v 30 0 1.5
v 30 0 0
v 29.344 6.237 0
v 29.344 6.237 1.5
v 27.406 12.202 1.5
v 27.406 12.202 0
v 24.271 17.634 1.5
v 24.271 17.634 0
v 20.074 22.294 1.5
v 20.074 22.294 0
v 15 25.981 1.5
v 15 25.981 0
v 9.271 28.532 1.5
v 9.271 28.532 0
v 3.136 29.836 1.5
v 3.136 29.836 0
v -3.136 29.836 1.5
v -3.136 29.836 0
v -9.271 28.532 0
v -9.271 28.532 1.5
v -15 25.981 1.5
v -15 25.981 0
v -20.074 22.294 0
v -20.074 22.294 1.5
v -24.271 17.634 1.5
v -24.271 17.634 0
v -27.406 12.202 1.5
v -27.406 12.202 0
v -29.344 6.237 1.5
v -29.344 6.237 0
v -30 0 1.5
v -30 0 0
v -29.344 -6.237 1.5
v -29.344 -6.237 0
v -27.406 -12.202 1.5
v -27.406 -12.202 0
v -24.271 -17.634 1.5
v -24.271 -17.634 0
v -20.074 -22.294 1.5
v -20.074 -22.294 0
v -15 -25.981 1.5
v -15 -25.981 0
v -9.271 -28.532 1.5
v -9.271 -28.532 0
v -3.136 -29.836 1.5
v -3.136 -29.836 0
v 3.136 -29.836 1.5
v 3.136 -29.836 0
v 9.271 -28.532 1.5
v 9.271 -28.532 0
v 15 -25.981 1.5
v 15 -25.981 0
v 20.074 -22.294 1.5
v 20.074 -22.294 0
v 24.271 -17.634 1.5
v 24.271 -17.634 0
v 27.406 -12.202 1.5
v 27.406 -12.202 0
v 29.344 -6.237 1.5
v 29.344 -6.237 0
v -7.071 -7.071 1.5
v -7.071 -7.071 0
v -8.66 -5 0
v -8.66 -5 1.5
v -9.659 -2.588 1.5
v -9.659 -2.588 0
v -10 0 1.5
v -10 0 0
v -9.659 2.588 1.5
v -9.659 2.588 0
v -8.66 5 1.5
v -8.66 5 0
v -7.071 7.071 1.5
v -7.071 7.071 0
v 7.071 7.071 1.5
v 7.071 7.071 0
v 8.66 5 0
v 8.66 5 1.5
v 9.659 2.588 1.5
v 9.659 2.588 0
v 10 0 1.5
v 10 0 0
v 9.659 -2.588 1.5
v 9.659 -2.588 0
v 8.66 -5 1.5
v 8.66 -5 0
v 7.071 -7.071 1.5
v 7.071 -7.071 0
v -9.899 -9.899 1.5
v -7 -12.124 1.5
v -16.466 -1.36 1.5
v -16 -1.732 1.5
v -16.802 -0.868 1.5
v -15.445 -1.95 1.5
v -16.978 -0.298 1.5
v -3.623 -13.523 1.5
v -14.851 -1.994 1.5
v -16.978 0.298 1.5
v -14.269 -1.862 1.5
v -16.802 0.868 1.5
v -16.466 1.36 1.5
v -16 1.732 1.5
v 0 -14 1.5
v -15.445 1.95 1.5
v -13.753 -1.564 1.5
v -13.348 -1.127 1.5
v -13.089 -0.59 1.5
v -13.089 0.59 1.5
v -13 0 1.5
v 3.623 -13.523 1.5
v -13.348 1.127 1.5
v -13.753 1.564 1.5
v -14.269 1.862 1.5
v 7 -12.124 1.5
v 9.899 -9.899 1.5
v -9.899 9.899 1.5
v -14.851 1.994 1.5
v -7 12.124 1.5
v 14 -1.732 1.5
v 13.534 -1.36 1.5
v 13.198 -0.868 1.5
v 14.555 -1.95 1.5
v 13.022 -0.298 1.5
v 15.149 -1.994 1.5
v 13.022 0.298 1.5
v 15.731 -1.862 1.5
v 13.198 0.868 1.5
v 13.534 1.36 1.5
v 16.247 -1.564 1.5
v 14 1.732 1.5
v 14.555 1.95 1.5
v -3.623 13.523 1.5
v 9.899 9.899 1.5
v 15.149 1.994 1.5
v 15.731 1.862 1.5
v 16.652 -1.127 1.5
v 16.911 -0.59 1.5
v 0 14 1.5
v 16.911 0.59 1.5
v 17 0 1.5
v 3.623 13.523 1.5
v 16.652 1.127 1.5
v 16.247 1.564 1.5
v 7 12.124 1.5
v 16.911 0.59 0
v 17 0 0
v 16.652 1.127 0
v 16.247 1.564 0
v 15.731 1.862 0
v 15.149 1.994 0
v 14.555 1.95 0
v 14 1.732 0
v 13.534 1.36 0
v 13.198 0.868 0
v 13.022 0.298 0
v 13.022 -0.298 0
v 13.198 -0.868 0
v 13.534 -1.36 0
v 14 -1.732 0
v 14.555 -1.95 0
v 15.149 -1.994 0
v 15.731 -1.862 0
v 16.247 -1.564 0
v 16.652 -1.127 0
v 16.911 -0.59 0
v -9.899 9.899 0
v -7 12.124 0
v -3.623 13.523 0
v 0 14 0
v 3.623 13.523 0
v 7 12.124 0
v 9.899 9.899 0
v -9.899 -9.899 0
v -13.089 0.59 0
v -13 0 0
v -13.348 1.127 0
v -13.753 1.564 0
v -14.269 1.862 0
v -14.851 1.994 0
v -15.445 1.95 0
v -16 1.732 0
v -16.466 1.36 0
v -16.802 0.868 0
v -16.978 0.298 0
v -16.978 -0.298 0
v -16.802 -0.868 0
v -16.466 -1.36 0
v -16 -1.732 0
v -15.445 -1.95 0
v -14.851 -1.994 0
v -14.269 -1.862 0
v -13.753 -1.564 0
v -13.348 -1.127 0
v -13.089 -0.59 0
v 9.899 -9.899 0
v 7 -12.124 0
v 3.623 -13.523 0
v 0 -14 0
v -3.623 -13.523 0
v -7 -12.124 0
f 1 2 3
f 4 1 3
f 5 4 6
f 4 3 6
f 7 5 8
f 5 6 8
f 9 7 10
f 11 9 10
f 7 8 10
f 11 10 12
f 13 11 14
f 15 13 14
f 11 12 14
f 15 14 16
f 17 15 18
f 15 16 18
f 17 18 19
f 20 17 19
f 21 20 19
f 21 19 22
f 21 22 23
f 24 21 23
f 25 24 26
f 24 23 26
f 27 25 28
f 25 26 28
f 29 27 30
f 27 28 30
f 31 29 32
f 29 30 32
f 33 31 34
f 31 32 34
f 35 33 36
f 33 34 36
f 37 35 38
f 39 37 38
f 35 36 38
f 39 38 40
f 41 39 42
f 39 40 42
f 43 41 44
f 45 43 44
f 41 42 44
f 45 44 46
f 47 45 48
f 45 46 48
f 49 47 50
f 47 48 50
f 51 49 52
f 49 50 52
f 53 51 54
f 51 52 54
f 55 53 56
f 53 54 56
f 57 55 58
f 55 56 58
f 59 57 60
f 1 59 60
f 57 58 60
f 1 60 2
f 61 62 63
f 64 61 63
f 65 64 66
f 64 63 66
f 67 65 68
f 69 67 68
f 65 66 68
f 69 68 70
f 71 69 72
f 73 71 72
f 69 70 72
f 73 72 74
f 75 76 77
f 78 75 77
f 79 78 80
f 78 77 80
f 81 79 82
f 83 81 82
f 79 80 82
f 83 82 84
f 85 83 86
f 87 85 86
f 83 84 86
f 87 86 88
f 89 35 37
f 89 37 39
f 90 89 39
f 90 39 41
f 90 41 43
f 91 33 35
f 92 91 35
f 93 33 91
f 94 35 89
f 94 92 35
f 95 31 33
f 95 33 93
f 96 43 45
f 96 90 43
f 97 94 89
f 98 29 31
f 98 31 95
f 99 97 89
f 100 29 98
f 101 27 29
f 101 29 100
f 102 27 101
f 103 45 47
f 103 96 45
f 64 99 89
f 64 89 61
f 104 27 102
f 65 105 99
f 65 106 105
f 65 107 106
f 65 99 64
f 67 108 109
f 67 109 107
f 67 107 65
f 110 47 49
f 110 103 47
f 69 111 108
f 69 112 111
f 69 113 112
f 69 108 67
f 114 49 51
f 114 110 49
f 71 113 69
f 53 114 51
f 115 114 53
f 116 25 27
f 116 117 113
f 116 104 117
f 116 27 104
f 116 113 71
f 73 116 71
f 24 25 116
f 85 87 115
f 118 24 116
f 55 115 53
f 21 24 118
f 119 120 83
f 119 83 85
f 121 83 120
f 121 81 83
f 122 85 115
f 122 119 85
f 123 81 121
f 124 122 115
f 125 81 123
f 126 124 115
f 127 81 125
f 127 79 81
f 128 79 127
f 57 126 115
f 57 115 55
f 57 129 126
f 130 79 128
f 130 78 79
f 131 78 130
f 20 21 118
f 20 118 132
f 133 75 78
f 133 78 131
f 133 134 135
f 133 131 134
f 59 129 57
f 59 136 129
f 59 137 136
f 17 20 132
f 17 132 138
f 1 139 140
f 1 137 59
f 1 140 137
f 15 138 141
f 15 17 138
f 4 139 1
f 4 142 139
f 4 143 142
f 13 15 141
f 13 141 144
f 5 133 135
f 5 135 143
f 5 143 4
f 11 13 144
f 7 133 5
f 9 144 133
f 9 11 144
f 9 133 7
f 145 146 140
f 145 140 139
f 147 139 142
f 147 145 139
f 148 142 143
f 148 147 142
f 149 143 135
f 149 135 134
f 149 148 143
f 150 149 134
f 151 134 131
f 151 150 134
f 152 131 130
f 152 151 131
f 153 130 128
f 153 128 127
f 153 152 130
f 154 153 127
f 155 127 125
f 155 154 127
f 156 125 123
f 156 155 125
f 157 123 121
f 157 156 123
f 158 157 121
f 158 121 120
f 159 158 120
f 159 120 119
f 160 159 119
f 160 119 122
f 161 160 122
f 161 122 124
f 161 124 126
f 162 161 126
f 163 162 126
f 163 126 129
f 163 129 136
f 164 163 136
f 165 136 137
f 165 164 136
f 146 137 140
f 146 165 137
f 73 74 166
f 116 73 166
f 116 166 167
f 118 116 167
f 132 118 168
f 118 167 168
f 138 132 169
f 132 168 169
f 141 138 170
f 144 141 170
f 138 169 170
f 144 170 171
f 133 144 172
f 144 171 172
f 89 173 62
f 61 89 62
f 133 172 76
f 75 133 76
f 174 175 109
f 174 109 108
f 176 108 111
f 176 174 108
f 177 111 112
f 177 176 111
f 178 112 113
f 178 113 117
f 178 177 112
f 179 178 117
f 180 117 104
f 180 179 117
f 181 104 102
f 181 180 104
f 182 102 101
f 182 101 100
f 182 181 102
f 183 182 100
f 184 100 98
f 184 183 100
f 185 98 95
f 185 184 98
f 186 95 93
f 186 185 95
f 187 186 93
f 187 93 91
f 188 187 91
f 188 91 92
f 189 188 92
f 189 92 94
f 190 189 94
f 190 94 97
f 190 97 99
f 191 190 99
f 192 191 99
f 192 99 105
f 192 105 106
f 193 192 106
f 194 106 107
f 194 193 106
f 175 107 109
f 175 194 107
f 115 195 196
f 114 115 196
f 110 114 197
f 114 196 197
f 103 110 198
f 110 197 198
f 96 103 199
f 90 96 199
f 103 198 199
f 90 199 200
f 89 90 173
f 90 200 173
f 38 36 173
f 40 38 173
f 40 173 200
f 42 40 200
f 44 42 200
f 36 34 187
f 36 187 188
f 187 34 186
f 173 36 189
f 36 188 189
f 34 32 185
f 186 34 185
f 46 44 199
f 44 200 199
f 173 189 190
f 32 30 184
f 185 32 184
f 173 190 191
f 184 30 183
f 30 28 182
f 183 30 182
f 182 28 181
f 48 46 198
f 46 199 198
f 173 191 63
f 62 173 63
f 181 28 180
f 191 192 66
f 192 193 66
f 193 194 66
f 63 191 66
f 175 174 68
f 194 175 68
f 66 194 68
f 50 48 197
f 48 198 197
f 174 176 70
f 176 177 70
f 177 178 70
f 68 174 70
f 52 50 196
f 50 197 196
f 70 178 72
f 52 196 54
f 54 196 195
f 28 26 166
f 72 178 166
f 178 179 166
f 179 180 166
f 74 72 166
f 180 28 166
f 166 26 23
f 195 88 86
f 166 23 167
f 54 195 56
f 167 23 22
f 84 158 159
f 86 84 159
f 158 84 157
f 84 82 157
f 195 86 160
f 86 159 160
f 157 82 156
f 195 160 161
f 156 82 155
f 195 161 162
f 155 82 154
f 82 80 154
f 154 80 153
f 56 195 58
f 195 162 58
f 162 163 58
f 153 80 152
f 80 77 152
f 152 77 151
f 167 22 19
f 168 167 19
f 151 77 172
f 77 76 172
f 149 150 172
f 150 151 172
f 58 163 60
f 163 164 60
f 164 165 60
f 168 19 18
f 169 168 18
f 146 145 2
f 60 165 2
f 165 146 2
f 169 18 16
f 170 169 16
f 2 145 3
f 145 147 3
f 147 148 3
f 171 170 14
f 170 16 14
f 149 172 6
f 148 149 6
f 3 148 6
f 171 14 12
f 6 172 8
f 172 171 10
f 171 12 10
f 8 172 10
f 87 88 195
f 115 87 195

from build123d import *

# Parameters (mm, degrees)
SKETCH1_R           = 30
SKETCH1_R_2         = 2
BOSS_EXTRUDE1_DEPTH = 1.5
CUT_EXTRUDE1_DEPTH  = 10


with BuildPart() as part:
    # Sketch1 → Boss-Extrude1 (new body)
    with BuildSketch(Plane.XY):
        Circle(SKETCH1_R)
        with Locations((15, 0)):
            Circle(SKETCH1_R_2, mode=Mode.SUBTRACT)
        with Locations((-15, 0)):
            Circle(SKETCH1_R_2, mode=Mode.SUBTRACT)
    extrude(amount=BOSS_EXTRUDE1_DEPTH)

    # Sketch2 → Cut-Extrude1 (cut)
    with BuildSketch(Plane(origin=(0, 0, 0), x_dir=(-1, 0, 0), z_dir=(0, 0, -1))):
        with BuildLine():
            Line((7.071067812, 7.071067812), (9.899494937, 9.899494937))
            ThreePointArc((9.899494937, 9.899494937), (0, 14), (-9.899494937, 9.899494937))
            Line((-9.899494937, 9.899494937), (-7.071067812, 7.071067812))
            ThreePointArc((-7.071067812, 7.071067812), (-10, 0), (-7.071067812, -7.071067812))
            Line((-7.071067812, -7.071067812), (-9.899494937, -9.899494937))
            ThreePointArc((-9.899494937, -9.899494937), (0, -14), (9.899494937, -9.899494937))
            Line((9.899494937, -9.899494937), (7.071067812, -7.071067812))
            ThreePointArc((7.071067812, -7.071067812), (10, 0), (7.071067812, 7.071067812))
        make_face()
    extrude(amount=-CUT_EXTRUDE1_DEPTH, mode=Mode.SUBTRACT)


solid = part.part
